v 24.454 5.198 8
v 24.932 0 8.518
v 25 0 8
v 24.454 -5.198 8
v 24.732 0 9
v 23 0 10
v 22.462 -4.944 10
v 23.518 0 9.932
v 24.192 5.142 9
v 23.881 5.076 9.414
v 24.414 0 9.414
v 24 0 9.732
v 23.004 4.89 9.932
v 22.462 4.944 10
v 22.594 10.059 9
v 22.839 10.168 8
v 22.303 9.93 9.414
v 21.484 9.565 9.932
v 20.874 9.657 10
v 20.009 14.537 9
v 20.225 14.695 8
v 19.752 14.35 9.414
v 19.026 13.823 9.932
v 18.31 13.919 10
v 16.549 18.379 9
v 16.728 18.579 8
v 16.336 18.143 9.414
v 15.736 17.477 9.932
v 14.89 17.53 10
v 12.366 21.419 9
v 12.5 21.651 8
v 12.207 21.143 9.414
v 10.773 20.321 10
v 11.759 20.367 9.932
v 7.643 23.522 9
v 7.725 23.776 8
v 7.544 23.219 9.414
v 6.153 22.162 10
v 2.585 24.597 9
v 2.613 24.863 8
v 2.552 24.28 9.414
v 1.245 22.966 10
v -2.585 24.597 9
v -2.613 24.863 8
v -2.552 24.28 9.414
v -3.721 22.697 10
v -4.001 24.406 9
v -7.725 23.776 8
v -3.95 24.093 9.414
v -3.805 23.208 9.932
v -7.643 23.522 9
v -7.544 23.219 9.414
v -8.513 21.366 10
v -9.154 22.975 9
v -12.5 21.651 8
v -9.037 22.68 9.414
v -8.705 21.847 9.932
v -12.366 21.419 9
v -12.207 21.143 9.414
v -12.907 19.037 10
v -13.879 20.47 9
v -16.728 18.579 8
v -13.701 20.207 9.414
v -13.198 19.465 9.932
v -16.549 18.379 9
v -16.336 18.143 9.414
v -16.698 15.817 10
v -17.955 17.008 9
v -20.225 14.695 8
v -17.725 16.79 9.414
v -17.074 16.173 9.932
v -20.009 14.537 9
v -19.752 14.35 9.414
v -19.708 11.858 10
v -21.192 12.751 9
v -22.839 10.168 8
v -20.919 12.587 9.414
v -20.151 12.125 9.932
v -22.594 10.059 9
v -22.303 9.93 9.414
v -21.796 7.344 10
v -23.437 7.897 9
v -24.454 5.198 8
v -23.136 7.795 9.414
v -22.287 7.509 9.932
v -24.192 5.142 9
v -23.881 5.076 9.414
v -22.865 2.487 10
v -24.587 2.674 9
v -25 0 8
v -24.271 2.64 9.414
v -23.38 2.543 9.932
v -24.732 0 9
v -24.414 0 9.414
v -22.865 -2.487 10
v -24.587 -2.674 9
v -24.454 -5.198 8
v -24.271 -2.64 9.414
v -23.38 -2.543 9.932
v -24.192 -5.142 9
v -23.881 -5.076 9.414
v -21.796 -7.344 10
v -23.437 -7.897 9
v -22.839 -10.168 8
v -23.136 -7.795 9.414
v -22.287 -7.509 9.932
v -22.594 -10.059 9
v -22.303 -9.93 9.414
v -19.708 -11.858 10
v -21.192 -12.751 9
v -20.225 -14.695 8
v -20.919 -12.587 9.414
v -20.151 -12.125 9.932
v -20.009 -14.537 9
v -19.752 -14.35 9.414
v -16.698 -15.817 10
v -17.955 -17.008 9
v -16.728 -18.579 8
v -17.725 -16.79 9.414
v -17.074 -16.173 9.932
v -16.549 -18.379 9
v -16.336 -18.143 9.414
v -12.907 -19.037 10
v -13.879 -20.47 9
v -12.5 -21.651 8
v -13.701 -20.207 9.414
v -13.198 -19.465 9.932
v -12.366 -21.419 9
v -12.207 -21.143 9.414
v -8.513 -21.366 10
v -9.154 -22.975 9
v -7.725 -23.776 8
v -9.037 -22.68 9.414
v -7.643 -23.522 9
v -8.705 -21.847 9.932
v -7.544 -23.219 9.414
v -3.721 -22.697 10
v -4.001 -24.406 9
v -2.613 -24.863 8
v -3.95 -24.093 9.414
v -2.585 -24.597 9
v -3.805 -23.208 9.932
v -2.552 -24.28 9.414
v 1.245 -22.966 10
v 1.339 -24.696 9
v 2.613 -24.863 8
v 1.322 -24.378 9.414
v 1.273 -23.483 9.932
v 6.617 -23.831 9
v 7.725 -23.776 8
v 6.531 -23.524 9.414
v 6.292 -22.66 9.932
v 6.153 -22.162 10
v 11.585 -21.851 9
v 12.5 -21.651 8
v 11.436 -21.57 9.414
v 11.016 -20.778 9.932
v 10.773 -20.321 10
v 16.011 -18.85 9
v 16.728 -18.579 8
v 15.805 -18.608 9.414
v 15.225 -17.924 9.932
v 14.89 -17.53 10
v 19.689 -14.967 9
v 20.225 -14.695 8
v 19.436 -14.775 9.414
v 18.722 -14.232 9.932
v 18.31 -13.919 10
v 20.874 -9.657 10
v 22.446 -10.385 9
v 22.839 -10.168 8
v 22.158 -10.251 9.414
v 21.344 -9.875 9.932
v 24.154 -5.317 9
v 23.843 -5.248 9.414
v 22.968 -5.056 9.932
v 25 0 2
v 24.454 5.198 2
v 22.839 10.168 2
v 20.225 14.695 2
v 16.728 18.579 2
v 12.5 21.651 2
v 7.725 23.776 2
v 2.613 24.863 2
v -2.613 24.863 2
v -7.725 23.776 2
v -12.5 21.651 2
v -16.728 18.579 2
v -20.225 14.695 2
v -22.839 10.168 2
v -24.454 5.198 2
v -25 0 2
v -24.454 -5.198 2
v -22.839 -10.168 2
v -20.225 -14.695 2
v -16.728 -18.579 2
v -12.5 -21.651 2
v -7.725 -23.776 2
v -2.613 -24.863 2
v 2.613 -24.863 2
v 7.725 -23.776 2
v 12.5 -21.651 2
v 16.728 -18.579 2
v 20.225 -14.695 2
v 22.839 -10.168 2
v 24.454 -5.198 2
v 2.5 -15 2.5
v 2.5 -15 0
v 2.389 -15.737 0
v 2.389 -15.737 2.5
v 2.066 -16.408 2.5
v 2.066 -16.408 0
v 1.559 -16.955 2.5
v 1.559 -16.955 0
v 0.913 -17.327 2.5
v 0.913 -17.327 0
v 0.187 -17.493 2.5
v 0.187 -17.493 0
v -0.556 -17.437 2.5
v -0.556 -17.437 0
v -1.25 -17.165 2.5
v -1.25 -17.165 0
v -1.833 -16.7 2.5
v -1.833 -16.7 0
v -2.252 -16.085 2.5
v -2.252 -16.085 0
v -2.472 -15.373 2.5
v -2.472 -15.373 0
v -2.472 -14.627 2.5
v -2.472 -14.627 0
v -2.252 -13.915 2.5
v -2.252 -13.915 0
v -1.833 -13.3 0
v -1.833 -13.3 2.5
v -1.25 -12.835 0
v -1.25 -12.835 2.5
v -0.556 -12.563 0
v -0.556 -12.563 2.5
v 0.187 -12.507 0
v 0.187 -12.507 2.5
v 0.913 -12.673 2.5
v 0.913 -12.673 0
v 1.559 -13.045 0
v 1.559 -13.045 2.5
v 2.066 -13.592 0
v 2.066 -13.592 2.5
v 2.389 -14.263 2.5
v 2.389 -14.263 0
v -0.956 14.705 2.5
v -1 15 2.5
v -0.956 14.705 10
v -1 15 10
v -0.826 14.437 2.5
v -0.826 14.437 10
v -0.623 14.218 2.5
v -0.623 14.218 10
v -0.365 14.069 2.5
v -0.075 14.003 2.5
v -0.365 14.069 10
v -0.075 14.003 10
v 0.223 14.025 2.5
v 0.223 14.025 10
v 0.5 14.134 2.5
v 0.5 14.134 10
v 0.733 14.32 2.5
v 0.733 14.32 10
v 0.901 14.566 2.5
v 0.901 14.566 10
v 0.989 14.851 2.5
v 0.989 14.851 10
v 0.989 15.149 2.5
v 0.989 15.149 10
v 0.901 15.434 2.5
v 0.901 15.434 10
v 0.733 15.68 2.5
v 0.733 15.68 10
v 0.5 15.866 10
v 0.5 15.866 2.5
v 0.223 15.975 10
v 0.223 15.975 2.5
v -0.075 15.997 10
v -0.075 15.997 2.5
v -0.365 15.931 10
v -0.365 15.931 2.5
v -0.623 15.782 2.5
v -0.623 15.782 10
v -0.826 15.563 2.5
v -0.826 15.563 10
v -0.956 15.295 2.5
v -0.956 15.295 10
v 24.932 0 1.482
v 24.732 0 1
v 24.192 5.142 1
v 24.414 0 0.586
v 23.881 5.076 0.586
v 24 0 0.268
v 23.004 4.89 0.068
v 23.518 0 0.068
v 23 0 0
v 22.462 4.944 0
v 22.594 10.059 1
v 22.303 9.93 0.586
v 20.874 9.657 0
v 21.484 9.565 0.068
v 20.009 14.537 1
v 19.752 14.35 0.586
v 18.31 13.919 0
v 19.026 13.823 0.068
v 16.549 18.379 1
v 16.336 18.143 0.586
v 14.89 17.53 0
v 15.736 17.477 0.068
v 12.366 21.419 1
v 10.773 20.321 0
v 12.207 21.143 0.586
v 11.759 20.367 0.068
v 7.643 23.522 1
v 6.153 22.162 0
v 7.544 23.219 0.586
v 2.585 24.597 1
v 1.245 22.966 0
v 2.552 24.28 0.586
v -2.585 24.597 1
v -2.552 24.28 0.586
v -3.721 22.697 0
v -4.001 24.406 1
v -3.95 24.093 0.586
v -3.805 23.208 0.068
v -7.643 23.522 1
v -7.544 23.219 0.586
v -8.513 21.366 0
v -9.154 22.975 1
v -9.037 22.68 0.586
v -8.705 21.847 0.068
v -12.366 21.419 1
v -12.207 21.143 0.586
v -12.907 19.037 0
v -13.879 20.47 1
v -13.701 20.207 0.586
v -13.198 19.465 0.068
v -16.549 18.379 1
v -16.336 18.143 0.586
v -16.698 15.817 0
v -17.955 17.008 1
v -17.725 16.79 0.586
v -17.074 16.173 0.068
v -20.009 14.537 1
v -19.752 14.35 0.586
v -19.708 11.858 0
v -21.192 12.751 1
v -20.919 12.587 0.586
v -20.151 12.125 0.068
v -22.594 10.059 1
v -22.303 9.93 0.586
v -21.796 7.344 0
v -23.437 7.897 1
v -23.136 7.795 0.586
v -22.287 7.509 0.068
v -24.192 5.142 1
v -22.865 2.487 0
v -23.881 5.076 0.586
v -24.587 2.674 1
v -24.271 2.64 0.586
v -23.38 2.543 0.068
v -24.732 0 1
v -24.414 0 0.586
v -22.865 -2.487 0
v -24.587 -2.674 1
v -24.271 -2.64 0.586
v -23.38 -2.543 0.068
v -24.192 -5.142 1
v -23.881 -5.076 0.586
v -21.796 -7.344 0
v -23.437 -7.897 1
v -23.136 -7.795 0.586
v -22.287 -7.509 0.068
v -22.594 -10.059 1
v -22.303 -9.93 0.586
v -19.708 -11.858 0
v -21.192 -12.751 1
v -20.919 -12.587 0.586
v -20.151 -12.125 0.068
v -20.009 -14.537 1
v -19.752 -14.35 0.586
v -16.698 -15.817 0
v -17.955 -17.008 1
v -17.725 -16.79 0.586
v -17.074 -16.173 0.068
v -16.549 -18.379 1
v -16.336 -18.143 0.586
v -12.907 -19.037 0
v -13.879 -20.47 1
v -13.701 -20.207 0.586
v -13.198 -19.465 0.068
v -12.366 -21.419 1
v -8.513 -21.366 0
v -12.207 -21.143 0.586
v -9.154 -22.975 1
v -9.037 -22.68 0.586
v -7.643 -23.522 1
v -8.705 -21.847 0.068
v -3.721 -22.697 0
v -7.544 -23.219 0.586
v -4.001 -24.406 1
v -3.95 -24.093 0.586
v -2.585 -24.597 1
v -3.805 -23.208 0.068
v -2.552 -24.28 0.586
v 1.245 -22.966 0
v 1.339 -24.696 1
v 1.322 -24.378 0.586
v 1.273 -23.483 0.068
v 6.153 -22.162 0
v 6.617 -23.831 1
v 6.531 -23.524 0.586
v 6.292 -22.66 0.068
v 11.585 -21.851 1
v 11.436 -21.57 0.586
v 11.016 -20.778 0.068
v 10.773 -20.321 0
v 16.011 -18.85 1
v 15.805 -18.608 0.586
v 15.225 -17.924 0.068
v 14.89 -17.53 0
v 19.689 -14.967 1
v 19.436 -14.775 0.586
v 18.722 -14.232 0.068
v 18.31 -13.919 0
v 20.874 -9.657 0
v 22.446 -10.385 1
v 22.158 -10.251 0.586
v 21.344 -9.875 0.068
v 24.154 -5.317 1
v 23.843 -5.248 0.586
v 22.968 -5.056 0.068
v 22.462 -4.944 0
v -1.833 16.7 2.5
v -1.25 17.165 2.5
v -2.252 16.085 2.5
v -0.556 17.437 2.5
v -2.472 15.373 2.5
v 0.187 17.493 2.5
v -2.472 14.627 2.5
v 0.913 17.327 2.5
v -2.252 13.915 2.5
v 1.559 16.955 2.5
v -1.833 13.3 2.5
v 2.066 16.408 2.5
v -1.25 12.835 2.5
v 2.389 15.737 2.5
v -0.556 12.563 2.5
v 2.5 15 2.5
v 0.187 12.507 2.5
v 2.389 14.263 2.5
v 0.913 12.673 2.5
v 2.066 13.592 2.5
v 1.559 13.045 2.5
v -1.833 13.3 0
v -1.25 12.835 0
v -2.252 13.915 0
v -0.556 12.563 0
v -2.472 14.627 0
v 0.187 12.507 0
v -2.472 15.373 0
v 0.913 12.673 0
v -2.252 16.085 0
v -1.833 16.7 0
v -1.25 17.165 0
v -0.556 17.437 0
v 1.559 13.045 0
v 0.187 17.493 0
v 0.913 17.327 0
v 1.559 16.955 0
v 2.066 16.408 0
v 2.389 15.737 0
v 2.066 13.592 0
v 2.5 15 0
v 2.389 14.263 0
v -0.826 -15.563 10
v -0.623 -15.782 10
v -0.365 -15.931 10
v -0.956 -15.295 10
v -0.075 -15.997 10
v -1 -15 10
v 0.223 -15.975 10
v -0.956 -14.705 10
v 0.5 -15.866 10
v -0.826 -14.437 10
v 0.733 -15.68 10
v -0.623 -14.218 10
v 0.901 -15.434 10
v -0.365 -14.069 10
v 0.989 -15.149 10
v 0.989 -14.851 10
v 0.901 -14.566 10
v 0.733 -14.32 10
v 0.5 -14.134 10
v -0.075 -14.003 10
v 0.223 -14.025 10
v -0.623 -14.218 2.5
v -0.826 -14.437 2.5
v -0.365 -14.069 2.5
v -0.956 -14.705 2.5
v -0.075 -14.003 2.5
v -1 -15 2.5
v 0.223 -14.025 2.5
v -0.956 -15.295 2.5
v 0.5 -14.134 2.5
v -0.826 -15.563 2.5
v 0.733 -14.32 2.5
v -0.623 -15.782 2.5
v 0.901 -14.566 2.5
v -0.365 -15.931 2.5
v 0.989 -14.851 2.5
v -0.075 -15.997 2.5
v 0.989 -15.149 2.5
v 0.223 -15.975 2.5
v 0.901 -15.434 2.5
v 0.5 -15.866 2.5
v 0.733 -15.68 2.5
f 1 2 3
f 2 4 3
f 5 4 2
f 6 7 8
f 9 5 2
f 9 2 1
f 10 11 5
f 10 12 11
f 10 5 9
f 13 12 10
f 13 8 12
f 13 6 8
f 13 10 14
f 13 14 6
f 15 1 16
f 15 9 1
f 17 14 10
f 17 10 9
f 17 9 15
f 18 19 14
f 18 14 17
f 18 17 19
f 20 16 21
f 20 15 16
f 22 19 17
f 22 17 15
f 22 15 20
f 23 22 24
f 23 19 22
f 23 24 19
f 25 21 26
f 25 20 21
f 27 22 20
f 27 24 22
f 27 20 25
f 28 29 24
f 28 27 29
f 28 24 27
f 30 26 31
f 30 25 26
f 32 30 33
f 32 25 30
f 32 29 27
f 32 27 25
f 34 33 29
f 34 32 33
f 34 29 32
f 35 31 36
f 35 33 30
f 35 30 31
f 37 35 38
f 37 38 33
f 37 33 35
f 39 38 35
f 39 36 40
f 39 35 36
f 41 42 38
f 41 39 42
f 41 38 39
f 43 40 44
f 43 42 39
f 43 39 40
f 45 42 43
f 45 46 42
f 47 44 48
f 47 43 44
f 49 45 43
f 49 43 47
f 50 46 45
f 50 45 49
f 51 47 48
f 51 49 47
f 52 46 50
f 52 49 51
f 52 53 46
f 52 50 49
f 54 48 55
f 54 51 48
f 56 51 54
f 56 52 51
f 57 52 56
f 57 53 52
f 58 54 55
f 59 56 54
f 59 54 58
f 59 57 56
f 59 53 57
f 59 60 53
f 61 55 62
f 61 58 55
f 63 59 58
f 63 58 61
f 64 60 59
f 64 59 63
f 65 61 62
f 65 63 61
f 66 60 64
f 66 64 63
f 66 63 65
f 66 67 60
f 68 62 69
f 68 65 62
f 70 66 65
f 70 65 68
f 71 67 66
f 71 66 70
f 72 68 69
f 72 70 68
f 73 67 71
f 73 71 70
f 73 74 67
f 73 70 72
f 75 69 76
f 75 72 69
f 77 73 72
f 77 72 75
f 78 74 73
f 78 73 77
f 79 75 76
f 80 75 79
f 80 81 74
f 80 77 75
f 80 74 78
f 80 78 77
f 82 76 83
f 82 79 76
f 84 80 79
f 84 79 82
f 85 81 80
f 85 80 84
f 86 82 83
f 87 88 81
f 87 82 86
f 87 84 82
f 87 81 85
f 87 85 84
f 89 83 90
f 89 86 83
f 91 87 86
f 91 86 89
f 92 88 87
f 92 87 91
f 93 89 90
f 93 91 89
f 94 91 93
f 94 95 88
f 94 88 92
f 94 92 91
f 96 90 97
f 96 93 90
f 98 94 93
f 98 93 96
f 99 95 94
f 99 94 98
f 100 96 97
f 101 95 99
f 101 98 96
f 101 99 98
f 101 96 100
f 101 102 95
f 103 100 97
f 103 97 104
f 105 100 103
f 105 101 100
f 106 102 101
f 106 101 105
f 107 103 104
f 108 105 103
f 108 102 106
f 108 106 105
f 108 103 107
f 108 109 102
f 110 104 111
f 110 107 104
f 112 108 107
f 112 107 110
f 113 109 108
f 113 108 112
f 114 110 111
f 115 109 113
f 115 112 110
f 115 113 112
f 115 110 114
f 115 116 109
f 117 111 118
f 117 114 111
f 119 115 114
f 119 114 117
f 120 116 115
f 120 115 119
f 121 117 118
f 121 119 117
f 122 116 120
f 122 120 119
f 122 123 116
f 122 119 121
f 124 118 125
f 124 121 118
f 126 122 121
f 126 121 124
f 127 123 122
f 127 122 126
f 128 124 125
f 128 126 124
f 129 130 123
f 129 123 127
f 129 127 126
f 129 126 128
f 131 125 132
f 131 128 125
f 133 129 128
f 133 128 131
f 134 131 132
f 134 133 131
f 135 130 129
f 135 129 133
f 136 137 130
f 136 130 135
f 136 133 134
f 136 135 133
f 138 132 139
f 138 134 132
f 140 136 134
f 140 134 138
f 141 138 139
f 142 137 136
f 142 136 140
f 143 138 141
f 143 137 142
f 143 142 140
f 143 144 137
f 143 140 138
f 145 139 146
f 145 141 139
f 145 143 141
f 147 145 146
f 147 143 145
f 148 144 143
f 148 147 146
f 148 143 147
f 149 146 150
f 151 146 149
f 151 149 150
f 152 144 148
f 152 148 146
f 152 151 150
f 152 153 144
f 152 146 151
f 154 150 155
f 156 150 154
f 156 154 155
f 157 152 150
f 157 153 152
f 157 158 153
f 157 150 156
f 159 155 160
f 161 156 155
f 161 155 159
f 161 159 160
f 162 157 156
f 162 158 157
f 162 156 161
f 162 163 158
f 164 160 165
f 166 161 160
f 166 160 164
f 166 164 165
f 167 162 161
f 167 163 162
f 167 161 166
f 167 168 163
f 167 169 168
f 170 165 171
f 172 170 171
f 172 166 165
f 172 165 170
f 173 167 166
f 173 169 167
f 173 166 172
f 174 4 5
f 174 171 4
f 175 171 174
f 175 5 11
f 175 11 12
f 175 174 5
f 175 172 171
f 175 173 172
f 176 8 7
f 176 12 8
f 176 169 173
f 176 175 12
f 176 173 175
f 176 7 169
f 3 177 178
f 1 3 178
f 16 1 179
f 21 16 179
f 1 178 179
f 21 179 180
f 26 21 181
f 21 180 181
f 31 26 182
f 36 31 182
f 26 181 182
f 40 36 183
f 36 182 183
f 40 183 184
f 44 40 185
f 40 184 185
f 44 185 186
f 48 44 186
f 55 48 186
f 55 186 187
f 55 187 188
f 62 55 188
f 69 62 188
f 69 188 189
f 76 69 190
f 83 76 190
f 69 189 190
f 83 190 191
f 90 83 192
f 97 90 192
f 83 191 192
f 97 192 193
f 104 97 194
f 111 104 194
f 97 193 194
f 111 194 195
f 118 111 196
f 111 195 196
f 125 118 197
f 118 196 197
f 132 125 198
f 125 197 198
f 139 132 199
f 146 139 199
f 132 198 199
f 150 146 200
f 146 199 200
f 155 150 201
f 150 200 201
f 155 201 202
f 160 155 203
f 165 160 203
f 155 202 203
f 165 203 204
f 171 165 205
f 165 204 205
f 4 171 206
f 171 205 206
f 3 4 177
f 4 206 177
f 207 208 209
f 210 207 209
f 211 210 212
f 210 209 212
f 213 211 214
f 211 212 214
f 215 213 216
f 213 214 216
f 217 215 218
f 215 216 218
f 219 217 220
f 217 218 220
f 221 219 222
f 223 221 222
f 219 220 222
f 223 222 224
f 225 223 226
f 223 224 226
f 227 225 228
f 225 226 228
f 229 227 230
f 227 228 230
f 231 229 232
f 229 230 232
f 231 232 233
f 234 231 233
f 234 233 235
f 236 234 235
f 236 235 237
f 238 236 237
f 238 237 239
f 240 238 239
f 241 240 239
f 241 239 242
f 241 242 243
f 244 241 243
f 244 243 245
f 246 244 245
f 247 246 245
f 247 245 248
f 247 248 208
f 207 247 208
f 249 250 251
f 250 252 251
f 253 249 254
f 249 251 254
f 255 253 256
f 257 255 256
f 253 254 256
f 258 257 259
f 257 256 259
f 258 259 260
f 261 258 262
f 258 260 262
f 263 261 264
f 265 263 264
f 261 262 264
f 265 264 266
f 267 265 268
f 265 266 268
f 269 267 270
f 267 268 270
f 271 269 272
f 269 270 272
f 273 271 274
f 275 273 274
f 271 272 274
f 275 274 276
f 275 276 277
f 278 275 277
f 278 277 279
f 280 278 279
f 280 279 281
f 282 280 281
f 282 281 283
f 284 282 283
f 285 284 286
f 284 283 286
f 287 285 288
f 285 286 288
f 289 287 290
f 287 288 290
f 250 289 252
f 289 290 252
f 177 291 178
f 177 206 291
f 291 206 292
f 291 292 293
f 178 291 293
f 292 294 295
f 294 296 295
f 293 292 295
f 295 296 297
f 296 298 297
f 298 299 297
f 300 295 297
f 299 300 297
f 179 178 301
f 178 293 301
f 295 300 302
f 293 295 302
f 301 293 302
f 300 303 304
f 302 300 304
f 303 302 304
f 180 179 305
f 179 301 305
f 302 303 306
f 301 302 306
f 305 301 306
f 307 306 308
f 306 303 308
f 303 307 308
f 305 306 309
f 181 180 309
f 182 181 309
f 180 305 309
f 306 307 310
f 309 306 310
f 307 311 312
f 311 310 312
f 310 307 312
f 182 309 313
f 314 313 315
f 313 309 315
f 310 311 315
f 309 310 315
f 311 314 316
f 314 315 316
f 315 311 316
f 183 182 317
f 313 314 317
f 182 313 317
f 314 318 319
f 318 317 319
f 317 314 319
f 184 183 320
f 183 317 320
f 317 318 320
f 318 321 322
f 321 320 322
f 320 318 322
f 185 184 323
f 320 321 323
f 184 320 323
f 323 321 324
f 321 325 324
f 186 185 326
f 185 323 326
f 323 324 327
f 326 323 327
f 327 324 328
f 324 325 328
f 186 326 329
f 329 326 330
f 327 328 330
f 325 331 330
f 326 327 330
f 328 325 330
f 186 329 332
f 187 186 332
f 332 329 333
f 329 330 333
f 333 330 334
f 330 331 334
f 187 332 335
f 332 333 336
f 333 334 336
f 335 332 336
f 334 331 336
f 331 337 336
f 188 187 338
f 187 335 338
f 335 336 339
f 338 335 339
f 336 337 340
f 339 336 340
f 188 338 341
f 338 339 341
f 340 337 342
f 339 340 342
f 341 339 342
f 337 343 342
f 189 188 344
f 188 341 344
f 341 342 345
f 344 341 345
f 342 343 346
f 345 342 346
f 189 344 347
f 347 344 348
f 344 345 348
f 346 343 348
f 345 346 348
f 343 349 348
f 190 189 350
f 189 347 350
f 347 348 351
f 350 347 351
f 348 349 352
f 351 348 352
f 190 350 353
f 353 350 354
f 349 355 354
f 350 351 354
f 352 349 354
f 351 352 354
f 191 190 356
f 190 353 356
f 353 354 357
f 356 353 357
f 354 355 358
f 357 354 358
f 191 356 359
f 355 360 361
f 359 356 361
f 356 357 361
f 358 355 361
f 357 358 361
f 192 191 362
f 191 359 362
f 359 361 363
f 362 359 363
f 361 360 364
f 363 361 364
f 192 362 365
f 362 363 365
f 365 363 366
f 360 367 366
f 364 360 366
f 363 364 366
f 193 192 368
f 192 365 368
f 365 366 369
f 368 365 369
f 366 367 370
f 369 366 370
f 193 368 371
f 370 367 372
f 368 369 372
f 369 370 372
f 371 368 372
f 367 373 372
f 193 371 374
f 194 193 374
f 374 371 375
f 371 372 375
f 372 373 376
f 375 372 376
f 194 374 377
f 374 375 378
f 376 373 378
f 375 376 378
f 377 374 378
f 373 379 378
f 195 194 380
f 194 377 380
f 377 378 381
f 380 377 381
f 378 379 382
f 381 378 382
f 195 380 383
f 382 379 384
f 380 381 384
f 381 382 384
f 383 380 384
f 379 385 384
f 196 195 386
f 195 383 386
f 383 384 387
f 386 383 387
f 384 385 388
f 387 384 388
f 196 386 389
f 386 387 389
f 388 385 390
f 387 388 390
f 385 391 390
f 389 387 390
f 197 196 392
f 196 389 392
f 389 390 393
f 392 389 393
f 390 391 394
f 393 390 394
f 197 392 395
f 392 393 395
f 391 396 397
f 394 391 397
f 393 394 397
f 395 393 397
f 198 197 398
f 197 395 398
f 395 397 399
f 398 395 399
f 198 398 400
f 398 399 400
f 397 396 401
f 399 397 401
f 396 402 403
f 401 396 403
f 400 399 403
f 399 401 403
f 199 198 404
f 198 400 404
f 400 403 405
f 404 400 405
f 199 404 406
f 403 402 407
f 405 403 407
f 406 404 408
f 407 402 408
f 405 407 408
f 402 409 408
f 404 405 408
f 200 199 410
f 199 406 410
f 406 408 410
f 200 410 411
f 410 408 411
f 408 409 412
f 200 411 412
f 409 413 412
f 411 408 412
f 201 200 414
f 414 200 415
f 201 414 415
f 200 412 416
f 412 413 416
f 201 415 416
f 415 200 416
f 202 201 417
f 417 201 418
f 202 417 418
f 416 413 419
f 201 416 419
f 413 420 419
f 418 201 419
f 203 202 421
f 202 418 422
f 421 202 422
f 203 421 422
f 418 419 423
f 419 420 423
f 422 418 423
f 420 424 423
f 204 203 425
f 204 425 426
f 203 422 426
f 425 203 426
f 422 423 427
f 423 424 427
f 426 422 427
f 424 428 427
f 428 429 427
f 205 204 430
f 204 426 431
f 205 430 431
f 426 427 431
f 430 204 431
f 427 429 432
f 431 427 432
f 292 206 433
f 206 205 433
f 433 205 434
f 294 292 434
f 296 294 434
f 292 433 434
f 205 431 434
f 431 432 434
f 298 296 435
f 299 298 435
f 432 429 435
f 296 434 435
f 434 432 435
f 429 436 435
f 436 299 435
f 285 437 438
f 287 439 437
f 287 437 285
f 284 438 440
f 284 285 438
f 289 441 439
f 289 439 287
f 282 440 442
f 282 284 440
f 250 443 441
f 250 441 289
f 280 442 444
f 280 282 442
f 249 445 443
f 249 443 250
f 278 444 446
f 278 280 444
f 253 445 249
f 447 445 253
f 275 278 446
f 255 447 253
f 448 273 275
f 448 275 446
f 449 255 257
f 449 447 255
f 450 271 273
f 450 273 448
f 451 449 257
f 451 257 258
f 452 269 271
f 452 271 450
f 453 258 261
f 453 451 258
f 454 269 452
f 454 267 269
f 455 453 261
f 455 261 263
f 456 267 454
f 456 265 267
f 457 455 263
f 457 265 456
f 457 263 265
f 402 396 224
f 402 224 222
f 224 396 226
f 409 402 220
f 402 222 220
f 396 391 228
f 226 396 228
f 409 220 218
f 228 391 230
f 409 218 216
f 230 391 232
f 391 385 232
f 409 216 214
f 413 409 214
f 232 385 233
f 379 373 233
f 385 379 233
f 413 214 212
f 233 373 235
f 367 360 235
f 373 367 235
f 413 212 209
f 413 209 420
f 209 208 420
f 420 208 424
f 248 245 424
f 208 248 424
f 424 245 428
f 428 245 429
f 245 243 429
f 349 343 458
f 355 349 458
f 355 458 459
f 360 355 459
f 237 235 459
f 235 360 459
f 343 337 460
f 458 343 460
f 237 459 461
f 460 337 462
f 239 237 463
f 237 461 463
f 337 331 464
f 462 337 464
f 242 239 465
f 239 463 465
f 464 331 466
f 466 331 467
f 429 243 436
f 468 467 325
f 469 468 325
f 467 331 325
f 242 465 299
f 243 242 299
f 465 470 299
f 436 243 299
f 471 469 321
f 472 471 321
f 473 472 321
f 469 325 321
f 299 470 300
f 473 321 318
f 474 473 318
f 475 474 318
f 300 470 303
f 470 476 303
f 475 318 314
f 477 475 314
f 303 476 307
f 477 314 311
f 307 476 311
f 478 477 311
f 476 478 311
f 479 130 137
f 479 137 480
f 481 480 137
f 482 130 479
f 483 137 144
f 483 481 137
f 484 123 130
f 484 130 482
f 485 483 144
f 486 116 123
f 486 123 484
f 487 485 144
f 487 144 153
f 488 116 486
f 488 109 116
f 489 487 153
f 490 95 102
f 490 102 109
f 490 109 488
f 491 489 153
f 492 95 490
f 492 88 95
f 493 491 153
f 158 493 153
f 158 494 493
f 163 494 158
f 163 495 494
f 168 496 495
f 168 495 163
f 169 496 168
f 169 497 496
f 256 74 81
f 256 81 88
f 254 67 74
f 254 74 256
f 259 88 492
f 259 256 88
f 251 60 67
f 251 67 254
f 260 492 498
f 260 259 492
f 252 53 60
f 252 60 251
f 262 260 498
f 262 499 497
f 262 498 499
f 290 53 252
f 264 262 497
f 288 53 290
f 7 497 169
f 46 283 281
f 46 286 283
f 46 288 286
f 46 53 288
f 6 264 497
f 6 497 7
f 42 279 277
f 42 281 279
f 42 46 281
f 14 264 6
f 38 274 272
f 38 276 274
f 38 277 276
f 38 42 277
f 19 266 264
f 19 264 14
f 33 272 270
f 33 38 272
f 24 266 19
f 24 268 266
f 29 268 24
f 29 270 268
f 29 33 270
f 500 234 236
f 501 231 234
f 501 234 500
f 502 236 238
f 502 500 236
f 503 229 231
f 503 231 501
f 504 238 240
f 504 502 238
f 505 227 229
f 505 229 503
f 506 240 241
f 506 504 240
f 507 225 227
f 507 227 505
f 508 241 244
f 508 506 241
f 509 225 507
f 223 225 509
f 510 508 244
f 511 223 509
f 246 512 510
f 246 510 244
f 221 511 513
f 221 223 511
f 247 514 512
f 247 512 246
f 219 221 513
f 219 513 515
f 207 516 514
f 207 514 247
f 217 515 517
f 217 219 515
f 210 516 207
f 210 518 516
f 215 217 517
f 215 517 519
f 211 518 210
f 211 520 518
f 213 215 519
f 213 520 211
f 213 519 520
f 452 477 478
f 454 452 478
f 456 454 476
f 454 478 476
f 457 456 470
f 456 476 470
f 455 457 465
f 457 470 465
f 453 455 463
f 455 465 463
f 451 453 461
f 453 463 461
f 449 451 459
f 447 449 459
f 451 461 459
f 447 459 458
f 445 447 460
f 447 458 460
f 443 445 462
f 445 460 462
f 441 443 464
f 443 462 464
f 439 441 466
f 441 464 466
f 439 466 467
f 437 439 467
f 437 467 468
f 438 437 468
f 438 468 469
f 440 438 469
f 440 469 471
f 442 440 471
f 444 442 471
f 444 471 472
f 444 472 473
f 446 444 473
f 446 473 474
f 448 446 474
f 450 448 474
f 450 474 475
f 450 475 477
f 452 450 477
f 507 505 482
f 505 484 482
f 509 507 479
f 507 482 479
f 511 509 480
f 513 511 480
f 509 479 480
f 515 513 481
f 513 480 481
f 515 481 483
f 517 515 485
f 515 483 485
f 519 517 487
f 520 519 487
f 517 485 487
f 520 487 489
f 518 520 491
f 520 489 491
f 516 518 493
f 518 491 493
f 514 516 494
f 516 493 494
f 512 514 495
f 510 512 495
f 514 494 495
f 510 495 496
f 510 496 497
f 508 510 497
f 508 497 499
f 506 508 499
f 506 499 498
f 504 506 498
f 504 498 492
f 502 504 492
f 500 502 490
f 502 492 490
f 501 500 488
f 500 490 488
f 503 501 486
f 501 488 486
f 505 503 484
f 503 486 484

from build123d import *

# Parameters (mm, degrees)
F0_R           = 25
F1_DEPTH       = 10
F2_R           = 2
F4_D           = 2
F4_CBORE_D     = 5
F4_CBORE_DEPTH = 2.5


with BuildPart() as f1:
    # F0 (on Top) → F1 (new body)
    with BuildSketch(Plane.XY):
        Circle(F0_R)
    extrude(amount=F1_DEPTH)

    # F2
    f2_edges = [f1.edges().sort_by_distance(p)[0] for p in [
        (-25, 0, 10),
        (-25, 0, 0),
    ]]
    fillet(f2_edges, radius=F2_R)

    # F4 (through all)
    with Locations(Plane(origin=(0, 0, 0), x_dir=(1, 0, 0), z_dir=(0, 0, -1))):
        with Locations((0, 15), (0, -15)):
            CounterBoreHole(F4_D / 2, F4_CBORE_D / 2, F4_CBORE_DEPTH)


solid = f1.part
